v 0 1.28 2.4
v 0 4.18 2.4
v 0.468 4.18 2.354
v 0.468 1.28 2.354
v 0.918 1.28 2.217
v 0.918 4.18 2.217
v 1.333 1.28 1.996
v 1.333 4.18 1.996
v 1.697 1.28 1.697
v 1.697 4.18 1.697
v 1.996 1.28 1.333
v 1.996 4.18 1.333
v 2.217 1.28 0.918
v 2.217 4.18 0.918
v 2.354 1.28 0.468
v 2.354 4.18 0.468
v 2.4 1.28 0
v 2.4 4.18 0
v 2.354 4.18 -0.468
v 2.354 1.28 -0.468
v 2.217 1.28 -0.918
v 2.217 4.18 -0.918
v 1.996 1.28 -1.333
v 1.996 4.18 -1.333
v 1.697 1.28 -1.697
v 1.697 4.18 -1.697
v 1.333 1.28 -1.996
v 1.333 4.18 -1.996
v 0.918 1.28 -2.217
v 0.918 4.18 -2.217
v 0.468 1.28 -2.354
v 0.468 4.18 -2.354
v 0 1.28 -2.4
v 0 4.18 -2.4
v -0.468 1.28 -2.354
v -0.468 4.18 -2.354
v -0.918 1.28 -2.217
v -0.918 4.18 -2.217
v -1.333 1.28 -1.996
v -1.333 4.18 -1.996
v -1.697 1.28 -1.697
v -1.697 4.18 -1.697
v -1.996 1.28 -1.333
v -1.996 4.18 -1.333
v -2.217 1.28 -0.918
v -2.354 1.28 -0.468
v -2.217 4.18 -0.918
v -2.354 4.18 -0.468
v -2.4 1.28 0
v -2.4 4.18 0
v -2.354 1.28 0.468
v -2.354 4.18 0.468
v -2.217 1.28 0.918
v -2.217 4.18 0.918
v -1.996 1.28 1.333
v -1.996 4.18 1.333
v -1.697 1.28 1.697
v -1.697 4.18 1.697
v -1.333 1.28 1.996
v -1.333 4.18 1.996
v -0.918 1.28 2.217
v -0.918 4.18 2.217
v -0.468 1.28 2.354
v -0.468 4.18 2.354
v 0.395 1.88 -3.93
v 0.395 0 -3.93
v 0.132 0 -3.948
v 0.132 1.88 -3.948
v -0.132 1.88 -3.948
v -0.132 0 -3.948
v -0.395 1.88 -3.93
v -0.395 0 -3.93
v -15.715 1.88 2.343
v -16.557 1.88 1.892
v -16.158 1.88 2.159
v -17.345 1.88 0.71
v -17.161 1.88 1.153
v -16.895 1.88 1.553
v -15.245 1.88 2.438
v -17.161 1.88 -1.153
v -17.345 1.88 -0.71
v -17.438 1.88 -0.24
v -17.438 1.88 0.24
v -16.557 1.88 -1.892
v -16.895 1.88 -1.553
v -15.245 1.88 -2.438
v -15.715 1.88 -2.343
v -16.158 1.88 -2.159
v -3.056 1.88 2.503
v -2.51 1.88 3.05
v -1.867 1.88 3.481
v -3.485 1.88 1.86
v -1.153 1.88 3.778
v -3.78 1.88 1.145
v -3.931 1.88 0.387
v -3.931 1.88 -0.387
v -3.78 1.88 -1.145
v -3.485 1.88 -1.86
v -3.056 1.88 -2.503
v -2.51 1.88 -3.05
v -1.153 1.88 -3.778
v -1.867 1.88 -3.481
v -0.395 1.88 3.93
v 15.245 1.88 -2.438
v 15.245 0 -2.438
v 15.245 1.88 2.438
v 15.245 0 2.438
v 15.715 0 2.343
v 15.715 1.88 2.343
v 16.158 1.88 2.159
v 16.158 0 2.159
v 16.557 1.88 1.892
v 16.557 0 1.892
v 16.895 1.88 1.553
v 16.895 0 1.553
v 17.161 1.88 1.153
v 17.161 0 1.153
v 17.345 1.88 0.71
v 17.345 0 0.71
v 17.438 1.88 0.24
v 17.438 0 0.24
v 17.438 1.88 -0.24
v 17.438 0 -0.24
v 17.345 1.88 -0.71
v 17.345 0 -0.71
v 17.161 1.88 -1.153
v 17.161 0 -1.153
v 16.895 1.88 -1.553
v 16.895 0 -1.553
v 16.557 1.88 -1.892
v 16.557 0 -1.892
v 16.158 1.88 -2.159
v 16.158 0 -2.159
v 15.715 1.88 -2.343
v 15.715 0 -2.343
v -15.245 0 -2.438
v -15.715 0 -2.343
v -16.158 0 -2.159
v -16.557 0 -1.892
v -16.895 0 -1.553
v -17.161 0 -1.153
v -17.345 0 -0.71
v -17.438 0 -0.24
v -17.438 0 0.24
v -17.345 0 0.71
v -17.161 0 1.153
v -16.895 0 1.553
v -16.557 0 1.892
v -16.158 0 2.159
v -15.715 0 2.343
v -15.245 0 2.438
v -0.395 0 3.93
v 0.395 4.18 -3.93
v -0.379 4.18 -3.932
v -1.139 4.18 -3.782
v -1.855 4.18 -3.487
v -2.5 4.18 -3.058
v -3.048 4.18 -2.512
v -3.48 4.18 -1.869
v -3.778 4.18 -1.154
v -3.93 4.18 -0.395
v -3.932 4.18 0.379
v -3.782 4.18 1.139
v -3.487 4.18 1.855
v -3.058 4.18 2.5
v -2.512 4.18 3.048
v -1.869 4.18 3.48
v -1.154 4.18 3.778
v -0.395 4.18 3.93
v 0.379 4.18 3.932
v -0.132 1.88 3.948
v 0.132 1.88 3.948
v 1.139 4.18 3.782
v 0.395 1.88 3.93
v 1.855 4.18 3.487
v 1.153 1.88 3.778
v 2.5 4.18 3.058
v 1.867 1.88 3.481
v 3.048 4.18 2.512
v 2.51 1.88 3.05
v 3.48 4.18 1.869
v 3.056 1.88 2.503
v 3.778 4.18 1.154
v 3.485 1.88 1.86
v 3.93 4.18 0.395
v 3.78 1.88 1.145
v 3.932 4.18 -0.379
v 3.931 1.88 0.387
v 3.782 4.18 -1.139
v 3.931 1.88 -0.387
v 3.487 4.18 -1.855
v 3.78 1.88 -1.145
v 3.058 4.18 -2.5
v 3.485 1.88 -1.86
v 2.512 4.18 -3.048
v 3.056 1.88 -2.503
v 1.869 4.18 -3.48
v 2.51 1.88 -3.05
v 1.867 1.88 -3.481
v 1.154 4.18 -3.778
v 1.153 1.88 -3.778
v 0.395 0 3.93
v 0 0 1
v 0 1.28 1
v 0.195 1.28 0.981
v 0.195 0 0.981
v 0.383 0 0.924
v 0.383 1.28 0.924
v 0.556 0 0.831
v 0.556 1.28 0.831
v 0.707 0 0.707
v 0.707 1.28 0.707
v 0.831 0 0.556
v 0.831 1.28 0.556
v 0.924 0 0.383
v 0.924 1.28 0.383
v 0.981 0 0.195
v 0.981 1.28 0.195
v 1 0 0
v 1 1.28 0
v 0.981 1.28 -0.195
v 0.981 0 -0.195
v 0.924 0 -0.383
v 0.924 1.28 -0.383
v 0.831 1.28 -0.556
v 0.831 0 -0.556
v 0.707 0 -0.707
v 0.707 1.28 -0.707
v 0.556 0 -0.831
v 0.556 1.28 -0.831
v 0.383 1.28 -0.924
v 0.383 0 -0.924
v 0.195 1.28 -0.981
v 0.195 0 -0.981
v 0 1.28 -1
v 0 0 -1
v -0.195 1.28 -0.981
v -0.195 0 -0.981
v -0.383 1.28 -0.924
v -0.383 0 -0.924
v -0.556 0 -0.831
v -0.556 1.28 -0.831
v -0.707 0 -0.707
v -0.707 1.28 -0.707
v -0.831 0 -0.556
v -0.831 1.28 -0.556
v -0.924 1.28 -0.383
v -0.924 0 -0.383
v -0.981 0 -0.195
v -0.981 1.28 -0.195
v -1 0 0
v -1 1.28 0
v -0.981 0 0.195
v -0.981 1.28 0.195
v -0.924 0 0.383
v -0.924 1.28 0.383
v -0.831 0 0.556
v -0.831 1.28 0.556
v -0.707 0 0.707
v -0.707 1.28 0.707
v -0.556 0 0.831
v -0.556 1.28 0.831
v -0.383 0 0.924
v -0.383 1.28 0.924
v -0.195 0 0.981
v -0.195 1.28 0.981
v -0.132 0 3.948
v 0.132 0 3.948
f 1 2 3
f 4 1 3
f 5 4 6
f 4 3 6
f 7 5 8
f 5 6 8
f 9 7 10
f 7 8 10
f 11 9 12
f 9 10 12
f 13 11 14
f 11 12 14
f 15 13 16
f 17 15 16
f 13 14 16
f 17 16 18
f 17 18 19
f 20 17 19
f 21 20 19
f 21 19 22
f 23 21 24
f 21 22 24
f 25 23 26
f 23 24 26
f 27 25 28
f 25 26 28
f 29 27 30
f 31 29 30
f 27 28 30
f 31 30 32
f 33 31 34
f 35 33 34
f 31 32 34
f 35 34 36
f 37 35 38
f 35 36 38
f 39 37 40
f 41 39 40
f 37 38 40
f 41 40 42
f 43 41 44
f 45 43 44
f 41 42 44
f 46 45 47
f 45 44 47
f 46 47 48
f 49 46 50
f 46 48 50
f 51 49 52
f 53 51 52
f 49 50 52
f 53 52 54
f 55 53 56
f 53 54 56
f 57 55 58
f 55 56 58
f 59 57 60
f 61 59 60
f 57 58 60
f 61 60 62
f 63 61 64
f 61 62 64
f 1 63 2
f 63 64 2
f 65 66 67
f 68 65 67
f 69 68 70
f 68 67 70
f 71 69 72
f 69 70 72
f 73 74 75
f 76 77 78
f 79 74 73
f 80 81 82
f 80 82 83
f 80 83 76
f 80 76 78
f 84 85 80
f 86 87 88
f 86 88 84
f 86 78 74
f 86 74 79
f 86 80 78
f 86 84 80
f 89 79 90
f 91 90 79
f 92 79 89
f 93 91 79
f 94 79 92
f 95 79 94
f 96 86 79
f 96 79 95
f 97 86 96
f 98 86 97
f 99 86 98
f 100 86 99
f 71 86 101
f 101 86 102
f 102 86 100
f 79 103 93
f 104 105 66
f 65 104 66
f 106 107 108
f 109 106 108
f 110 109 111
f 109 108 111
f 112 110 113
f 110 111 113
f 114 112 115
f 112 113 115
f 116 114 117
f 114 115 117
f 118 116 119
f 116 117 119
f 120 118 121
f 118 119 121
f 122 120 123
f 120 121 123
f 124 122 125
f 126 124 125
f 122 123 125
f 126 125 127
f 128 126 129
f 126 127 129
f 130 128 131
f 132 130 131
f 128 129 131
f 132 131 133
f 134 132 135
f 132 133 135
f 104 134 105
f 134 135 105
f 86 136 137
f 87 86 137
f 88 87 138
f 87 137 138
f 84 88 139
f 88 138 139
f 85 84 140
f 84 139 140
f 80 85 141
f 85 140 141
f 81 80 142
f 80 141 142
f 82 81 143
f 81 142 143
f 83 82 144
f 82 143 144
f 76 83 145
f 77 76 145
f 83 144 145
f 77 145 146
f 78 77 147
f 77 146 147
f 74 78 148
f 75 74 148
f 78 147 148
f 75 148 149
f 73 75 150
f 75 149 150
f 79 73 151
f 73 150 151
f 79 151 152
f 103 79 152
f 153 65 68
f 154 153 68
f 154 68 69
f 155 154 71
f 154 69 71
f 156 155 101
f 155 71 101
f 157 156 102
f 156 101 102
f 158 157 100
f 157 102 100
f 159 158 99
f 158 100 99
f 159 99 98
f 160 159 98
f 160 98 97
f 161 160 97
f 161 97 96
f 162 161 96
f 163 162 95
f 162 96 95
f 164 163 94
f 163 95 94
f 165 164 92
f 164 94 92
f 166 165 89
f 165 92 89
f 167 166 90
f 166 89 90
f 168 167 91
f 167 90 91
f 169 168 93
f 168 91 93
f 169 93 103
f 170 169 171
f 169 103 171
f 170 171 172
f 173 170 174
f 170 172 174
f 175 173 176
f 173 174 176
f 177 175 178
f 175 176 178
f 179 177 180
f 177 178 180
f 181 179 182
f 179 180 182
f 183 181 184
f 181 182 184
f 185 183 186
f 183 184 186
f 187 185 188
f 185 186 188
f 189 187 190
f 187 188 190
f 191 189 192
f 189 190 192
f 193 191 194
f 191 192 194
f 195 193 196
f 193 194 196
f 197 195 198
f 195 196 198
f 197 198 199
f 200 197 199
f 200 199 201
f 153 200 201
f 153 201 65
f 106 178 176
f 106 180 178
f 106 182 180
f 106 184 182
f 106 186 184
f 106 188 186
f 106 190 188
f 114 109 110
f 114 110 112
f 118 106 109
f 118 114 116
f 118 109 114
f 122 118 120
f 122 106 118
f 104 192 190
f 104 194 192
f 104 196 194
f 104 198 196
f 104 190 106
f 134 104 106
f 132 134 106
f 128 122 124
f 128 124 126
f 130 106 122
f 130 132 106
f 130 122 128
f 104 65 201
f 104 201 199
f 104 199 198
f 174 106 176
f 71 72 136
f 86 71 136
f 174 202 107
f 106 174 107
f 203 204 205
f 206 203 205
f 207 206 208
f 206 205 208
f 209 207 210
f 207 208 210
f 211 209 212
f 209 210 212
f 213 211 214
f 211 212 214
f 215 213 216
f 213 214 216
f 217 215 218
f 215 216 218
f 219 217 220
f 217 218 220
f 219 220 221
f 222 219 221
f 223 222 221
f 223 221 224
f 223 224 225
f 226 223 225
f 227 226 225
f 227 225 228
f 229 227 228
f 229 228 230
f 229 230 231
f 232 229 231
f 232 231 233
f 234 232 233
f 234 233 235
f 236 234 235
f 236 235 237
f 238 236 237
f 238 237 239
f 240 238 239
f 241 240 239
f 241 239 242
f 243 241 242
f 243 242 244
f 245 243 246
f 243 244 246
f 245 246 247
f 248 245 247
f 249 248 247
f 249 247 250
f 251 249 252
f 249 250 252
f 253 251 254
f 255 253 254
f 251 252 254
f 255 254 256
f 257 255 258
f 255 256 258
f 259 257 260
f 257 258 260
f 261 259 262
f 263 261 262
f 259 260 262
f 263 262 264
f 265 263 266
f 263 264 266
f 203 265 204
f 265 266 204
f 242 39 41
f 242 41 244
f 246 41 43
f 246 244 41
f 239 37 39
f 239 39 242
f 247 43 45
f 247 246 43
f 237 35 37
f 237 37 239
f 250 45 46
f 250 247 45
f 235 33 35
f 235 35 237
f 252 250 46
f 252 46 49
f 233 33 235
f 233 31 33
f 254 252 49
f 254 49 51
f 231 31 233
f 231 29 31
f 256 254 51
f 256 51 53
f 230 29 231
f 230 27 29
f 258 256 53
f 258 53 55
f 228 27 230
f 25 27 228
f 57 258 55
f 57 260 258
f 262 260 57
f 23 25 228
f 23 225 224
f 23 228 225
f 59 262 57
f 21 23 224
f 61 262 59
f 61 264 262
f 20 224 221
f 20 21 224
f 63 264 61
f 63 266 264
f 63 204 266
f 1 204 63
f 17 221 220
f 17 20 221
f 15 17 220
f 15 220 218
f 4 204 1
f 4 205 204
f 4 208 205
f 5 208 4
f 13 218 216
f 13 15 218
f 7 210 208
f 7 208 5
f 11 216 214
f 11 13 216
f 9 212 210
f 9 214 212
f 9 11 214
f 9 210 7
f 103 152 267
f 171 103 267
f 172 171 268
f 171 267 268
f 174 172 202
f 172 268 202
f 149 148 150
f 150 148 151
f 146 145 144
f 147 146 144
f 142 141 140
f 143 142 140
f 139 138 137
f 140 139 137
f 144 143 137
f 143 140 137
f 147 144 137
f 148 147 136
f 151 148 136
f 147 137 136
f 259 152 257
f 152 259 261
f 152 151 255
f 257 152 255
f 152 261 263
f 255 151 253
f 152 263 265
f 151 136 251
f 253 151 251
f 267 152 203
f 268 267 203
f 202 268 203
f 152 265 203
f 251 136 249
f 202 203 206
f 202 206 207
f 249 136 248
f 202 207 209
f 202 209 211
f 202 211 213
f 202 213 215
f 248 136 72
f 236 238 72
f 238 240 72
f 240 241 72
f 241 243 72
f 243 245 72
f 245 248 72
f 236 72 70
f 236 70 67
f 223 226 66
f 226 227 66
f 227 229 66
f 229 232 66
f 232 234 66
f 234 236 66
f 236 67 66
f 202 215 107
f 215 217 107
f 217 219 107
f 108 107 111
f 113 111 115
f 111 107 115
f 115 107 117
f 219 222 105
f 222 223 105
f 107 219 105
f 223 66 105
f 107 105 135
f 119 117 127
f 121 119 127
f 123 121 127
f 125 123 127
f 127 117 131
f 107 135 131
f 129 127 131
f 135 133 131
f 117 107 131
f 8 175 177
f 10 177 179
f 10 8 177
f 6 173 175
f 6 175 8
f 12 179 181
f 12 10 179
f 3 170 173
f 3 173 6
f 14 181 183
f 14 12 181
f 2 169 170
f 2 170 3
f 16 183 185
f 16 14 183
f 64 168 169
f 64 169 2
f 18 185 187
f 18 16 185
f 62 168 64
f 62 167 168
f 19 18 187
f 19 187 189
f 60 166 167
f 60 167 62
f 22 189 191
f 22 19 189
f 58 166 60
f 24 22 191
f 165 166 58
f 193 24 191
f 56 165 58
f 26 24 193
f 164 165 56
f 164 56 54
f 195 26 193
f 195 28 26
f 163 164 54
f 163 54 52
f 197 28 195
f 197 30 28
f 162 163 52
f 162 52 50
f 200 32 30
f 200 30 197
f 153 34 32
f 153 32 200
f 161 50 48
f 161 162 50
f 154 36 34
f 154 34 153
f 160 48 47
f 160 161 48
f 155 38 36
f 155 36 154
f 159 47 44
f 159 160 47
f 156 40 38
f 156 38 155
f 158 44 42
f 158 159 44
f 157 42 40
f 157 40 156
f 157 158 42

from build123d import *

# Parameters (mm, degrees)
BOSS_EXTRU_1_DEPTH      = 1.88
ESQUISSE2_R             = 3.95
BOSS_EXTRU_2_DEPTH      = 2.3
ESQUISSE3_R             = 2.4
ENL_V_MAT_EXTRU_1_DEPTH = 2.9
ESQUISSE4_R             = 1
ENL_V_MAT_EXTRU_2_DEPTH = 2.9


with BuildPart() as part:
    # Esquisse1 → Boss.-Extru.1 (new body)
    with BuildSketch(Plane(origin=(0, 0, 0), x_dir=(1, 0, 0), z_dir=(0, 1, 0))):
        with BuildLine():
            Line((-0.395, 3.930200377), (-15.245, 2.437719221))
            ThreePointArc((-15.245, 2.437719221), (-17.45, 0), (-15.245, -2.437719221))
            Line((-15.245, -2.437719221), (-0.395, -3.930200377))
            ThreePointArc((-0.395, -3.930200377), (0, -3.95), (0.395, -3.930200377))
            Line((0.395, -3.930200377), (15.245, -2.437719221))
            ThreePointArc((15.245, -2.437719221), (17.45, 0), (15.245, 2.437719221))
            Line((15.245, 2.437719221), (0.395, 3.930200377))
            ThreePointArc((0.395, 3.930200377), (0, 3.95), (-0.395, 3.930200377))
        make_face()
    extrude(amount=BOSS_EXTRU_1_DEPTH)

    # Esquisse2 → Boss.-Extru.2 (add)
    with BuildSketch(Plane(origin=(0, 1.88, 0), x_dir=(1, 0, 0), z_dir=(0, 1, 0))):
        with Locations(Location((0, 0, 0), (0, 0, 84.260829523))):
            Circle(ESQUISSE2_R)
    extrude(amount=BOSS_EXTRU_2_DEPTH)

    # Esquisse3 → Enlèv. mat.-Extru.1 (cut)
    with BuildSketch(Plane(origin=(0, 4.18, 0), x_dir=(1, 0, 0), z_dir=(0, 1, 0))):
        with Locations(Location((0, 0, 0), (0, 0, 270))):
            Circle(ESQUISSE3_R)
    extrude(amount=-ENL_V_MAT_EXTRU_1_DEPTH, mode=Mode.SUBTRACT)

    # Esquisse4 → Enlèv. mat.-Extru.2 (cut)
    with BuildSketch(Plane(origin=(0, 1.28, 0), x_dir=(1, 0, 0), z_dir=(0, 1, 0))):
        with Locations(Location((0, 0, 0), (0, 0, 270))):
            Circle(ESQUISSE4_R)
    extrude(amount=-ENL_V_MAT_EXTRU_2_DEPTH, mode=Mode.SUBTRACT)


solid = part.part
